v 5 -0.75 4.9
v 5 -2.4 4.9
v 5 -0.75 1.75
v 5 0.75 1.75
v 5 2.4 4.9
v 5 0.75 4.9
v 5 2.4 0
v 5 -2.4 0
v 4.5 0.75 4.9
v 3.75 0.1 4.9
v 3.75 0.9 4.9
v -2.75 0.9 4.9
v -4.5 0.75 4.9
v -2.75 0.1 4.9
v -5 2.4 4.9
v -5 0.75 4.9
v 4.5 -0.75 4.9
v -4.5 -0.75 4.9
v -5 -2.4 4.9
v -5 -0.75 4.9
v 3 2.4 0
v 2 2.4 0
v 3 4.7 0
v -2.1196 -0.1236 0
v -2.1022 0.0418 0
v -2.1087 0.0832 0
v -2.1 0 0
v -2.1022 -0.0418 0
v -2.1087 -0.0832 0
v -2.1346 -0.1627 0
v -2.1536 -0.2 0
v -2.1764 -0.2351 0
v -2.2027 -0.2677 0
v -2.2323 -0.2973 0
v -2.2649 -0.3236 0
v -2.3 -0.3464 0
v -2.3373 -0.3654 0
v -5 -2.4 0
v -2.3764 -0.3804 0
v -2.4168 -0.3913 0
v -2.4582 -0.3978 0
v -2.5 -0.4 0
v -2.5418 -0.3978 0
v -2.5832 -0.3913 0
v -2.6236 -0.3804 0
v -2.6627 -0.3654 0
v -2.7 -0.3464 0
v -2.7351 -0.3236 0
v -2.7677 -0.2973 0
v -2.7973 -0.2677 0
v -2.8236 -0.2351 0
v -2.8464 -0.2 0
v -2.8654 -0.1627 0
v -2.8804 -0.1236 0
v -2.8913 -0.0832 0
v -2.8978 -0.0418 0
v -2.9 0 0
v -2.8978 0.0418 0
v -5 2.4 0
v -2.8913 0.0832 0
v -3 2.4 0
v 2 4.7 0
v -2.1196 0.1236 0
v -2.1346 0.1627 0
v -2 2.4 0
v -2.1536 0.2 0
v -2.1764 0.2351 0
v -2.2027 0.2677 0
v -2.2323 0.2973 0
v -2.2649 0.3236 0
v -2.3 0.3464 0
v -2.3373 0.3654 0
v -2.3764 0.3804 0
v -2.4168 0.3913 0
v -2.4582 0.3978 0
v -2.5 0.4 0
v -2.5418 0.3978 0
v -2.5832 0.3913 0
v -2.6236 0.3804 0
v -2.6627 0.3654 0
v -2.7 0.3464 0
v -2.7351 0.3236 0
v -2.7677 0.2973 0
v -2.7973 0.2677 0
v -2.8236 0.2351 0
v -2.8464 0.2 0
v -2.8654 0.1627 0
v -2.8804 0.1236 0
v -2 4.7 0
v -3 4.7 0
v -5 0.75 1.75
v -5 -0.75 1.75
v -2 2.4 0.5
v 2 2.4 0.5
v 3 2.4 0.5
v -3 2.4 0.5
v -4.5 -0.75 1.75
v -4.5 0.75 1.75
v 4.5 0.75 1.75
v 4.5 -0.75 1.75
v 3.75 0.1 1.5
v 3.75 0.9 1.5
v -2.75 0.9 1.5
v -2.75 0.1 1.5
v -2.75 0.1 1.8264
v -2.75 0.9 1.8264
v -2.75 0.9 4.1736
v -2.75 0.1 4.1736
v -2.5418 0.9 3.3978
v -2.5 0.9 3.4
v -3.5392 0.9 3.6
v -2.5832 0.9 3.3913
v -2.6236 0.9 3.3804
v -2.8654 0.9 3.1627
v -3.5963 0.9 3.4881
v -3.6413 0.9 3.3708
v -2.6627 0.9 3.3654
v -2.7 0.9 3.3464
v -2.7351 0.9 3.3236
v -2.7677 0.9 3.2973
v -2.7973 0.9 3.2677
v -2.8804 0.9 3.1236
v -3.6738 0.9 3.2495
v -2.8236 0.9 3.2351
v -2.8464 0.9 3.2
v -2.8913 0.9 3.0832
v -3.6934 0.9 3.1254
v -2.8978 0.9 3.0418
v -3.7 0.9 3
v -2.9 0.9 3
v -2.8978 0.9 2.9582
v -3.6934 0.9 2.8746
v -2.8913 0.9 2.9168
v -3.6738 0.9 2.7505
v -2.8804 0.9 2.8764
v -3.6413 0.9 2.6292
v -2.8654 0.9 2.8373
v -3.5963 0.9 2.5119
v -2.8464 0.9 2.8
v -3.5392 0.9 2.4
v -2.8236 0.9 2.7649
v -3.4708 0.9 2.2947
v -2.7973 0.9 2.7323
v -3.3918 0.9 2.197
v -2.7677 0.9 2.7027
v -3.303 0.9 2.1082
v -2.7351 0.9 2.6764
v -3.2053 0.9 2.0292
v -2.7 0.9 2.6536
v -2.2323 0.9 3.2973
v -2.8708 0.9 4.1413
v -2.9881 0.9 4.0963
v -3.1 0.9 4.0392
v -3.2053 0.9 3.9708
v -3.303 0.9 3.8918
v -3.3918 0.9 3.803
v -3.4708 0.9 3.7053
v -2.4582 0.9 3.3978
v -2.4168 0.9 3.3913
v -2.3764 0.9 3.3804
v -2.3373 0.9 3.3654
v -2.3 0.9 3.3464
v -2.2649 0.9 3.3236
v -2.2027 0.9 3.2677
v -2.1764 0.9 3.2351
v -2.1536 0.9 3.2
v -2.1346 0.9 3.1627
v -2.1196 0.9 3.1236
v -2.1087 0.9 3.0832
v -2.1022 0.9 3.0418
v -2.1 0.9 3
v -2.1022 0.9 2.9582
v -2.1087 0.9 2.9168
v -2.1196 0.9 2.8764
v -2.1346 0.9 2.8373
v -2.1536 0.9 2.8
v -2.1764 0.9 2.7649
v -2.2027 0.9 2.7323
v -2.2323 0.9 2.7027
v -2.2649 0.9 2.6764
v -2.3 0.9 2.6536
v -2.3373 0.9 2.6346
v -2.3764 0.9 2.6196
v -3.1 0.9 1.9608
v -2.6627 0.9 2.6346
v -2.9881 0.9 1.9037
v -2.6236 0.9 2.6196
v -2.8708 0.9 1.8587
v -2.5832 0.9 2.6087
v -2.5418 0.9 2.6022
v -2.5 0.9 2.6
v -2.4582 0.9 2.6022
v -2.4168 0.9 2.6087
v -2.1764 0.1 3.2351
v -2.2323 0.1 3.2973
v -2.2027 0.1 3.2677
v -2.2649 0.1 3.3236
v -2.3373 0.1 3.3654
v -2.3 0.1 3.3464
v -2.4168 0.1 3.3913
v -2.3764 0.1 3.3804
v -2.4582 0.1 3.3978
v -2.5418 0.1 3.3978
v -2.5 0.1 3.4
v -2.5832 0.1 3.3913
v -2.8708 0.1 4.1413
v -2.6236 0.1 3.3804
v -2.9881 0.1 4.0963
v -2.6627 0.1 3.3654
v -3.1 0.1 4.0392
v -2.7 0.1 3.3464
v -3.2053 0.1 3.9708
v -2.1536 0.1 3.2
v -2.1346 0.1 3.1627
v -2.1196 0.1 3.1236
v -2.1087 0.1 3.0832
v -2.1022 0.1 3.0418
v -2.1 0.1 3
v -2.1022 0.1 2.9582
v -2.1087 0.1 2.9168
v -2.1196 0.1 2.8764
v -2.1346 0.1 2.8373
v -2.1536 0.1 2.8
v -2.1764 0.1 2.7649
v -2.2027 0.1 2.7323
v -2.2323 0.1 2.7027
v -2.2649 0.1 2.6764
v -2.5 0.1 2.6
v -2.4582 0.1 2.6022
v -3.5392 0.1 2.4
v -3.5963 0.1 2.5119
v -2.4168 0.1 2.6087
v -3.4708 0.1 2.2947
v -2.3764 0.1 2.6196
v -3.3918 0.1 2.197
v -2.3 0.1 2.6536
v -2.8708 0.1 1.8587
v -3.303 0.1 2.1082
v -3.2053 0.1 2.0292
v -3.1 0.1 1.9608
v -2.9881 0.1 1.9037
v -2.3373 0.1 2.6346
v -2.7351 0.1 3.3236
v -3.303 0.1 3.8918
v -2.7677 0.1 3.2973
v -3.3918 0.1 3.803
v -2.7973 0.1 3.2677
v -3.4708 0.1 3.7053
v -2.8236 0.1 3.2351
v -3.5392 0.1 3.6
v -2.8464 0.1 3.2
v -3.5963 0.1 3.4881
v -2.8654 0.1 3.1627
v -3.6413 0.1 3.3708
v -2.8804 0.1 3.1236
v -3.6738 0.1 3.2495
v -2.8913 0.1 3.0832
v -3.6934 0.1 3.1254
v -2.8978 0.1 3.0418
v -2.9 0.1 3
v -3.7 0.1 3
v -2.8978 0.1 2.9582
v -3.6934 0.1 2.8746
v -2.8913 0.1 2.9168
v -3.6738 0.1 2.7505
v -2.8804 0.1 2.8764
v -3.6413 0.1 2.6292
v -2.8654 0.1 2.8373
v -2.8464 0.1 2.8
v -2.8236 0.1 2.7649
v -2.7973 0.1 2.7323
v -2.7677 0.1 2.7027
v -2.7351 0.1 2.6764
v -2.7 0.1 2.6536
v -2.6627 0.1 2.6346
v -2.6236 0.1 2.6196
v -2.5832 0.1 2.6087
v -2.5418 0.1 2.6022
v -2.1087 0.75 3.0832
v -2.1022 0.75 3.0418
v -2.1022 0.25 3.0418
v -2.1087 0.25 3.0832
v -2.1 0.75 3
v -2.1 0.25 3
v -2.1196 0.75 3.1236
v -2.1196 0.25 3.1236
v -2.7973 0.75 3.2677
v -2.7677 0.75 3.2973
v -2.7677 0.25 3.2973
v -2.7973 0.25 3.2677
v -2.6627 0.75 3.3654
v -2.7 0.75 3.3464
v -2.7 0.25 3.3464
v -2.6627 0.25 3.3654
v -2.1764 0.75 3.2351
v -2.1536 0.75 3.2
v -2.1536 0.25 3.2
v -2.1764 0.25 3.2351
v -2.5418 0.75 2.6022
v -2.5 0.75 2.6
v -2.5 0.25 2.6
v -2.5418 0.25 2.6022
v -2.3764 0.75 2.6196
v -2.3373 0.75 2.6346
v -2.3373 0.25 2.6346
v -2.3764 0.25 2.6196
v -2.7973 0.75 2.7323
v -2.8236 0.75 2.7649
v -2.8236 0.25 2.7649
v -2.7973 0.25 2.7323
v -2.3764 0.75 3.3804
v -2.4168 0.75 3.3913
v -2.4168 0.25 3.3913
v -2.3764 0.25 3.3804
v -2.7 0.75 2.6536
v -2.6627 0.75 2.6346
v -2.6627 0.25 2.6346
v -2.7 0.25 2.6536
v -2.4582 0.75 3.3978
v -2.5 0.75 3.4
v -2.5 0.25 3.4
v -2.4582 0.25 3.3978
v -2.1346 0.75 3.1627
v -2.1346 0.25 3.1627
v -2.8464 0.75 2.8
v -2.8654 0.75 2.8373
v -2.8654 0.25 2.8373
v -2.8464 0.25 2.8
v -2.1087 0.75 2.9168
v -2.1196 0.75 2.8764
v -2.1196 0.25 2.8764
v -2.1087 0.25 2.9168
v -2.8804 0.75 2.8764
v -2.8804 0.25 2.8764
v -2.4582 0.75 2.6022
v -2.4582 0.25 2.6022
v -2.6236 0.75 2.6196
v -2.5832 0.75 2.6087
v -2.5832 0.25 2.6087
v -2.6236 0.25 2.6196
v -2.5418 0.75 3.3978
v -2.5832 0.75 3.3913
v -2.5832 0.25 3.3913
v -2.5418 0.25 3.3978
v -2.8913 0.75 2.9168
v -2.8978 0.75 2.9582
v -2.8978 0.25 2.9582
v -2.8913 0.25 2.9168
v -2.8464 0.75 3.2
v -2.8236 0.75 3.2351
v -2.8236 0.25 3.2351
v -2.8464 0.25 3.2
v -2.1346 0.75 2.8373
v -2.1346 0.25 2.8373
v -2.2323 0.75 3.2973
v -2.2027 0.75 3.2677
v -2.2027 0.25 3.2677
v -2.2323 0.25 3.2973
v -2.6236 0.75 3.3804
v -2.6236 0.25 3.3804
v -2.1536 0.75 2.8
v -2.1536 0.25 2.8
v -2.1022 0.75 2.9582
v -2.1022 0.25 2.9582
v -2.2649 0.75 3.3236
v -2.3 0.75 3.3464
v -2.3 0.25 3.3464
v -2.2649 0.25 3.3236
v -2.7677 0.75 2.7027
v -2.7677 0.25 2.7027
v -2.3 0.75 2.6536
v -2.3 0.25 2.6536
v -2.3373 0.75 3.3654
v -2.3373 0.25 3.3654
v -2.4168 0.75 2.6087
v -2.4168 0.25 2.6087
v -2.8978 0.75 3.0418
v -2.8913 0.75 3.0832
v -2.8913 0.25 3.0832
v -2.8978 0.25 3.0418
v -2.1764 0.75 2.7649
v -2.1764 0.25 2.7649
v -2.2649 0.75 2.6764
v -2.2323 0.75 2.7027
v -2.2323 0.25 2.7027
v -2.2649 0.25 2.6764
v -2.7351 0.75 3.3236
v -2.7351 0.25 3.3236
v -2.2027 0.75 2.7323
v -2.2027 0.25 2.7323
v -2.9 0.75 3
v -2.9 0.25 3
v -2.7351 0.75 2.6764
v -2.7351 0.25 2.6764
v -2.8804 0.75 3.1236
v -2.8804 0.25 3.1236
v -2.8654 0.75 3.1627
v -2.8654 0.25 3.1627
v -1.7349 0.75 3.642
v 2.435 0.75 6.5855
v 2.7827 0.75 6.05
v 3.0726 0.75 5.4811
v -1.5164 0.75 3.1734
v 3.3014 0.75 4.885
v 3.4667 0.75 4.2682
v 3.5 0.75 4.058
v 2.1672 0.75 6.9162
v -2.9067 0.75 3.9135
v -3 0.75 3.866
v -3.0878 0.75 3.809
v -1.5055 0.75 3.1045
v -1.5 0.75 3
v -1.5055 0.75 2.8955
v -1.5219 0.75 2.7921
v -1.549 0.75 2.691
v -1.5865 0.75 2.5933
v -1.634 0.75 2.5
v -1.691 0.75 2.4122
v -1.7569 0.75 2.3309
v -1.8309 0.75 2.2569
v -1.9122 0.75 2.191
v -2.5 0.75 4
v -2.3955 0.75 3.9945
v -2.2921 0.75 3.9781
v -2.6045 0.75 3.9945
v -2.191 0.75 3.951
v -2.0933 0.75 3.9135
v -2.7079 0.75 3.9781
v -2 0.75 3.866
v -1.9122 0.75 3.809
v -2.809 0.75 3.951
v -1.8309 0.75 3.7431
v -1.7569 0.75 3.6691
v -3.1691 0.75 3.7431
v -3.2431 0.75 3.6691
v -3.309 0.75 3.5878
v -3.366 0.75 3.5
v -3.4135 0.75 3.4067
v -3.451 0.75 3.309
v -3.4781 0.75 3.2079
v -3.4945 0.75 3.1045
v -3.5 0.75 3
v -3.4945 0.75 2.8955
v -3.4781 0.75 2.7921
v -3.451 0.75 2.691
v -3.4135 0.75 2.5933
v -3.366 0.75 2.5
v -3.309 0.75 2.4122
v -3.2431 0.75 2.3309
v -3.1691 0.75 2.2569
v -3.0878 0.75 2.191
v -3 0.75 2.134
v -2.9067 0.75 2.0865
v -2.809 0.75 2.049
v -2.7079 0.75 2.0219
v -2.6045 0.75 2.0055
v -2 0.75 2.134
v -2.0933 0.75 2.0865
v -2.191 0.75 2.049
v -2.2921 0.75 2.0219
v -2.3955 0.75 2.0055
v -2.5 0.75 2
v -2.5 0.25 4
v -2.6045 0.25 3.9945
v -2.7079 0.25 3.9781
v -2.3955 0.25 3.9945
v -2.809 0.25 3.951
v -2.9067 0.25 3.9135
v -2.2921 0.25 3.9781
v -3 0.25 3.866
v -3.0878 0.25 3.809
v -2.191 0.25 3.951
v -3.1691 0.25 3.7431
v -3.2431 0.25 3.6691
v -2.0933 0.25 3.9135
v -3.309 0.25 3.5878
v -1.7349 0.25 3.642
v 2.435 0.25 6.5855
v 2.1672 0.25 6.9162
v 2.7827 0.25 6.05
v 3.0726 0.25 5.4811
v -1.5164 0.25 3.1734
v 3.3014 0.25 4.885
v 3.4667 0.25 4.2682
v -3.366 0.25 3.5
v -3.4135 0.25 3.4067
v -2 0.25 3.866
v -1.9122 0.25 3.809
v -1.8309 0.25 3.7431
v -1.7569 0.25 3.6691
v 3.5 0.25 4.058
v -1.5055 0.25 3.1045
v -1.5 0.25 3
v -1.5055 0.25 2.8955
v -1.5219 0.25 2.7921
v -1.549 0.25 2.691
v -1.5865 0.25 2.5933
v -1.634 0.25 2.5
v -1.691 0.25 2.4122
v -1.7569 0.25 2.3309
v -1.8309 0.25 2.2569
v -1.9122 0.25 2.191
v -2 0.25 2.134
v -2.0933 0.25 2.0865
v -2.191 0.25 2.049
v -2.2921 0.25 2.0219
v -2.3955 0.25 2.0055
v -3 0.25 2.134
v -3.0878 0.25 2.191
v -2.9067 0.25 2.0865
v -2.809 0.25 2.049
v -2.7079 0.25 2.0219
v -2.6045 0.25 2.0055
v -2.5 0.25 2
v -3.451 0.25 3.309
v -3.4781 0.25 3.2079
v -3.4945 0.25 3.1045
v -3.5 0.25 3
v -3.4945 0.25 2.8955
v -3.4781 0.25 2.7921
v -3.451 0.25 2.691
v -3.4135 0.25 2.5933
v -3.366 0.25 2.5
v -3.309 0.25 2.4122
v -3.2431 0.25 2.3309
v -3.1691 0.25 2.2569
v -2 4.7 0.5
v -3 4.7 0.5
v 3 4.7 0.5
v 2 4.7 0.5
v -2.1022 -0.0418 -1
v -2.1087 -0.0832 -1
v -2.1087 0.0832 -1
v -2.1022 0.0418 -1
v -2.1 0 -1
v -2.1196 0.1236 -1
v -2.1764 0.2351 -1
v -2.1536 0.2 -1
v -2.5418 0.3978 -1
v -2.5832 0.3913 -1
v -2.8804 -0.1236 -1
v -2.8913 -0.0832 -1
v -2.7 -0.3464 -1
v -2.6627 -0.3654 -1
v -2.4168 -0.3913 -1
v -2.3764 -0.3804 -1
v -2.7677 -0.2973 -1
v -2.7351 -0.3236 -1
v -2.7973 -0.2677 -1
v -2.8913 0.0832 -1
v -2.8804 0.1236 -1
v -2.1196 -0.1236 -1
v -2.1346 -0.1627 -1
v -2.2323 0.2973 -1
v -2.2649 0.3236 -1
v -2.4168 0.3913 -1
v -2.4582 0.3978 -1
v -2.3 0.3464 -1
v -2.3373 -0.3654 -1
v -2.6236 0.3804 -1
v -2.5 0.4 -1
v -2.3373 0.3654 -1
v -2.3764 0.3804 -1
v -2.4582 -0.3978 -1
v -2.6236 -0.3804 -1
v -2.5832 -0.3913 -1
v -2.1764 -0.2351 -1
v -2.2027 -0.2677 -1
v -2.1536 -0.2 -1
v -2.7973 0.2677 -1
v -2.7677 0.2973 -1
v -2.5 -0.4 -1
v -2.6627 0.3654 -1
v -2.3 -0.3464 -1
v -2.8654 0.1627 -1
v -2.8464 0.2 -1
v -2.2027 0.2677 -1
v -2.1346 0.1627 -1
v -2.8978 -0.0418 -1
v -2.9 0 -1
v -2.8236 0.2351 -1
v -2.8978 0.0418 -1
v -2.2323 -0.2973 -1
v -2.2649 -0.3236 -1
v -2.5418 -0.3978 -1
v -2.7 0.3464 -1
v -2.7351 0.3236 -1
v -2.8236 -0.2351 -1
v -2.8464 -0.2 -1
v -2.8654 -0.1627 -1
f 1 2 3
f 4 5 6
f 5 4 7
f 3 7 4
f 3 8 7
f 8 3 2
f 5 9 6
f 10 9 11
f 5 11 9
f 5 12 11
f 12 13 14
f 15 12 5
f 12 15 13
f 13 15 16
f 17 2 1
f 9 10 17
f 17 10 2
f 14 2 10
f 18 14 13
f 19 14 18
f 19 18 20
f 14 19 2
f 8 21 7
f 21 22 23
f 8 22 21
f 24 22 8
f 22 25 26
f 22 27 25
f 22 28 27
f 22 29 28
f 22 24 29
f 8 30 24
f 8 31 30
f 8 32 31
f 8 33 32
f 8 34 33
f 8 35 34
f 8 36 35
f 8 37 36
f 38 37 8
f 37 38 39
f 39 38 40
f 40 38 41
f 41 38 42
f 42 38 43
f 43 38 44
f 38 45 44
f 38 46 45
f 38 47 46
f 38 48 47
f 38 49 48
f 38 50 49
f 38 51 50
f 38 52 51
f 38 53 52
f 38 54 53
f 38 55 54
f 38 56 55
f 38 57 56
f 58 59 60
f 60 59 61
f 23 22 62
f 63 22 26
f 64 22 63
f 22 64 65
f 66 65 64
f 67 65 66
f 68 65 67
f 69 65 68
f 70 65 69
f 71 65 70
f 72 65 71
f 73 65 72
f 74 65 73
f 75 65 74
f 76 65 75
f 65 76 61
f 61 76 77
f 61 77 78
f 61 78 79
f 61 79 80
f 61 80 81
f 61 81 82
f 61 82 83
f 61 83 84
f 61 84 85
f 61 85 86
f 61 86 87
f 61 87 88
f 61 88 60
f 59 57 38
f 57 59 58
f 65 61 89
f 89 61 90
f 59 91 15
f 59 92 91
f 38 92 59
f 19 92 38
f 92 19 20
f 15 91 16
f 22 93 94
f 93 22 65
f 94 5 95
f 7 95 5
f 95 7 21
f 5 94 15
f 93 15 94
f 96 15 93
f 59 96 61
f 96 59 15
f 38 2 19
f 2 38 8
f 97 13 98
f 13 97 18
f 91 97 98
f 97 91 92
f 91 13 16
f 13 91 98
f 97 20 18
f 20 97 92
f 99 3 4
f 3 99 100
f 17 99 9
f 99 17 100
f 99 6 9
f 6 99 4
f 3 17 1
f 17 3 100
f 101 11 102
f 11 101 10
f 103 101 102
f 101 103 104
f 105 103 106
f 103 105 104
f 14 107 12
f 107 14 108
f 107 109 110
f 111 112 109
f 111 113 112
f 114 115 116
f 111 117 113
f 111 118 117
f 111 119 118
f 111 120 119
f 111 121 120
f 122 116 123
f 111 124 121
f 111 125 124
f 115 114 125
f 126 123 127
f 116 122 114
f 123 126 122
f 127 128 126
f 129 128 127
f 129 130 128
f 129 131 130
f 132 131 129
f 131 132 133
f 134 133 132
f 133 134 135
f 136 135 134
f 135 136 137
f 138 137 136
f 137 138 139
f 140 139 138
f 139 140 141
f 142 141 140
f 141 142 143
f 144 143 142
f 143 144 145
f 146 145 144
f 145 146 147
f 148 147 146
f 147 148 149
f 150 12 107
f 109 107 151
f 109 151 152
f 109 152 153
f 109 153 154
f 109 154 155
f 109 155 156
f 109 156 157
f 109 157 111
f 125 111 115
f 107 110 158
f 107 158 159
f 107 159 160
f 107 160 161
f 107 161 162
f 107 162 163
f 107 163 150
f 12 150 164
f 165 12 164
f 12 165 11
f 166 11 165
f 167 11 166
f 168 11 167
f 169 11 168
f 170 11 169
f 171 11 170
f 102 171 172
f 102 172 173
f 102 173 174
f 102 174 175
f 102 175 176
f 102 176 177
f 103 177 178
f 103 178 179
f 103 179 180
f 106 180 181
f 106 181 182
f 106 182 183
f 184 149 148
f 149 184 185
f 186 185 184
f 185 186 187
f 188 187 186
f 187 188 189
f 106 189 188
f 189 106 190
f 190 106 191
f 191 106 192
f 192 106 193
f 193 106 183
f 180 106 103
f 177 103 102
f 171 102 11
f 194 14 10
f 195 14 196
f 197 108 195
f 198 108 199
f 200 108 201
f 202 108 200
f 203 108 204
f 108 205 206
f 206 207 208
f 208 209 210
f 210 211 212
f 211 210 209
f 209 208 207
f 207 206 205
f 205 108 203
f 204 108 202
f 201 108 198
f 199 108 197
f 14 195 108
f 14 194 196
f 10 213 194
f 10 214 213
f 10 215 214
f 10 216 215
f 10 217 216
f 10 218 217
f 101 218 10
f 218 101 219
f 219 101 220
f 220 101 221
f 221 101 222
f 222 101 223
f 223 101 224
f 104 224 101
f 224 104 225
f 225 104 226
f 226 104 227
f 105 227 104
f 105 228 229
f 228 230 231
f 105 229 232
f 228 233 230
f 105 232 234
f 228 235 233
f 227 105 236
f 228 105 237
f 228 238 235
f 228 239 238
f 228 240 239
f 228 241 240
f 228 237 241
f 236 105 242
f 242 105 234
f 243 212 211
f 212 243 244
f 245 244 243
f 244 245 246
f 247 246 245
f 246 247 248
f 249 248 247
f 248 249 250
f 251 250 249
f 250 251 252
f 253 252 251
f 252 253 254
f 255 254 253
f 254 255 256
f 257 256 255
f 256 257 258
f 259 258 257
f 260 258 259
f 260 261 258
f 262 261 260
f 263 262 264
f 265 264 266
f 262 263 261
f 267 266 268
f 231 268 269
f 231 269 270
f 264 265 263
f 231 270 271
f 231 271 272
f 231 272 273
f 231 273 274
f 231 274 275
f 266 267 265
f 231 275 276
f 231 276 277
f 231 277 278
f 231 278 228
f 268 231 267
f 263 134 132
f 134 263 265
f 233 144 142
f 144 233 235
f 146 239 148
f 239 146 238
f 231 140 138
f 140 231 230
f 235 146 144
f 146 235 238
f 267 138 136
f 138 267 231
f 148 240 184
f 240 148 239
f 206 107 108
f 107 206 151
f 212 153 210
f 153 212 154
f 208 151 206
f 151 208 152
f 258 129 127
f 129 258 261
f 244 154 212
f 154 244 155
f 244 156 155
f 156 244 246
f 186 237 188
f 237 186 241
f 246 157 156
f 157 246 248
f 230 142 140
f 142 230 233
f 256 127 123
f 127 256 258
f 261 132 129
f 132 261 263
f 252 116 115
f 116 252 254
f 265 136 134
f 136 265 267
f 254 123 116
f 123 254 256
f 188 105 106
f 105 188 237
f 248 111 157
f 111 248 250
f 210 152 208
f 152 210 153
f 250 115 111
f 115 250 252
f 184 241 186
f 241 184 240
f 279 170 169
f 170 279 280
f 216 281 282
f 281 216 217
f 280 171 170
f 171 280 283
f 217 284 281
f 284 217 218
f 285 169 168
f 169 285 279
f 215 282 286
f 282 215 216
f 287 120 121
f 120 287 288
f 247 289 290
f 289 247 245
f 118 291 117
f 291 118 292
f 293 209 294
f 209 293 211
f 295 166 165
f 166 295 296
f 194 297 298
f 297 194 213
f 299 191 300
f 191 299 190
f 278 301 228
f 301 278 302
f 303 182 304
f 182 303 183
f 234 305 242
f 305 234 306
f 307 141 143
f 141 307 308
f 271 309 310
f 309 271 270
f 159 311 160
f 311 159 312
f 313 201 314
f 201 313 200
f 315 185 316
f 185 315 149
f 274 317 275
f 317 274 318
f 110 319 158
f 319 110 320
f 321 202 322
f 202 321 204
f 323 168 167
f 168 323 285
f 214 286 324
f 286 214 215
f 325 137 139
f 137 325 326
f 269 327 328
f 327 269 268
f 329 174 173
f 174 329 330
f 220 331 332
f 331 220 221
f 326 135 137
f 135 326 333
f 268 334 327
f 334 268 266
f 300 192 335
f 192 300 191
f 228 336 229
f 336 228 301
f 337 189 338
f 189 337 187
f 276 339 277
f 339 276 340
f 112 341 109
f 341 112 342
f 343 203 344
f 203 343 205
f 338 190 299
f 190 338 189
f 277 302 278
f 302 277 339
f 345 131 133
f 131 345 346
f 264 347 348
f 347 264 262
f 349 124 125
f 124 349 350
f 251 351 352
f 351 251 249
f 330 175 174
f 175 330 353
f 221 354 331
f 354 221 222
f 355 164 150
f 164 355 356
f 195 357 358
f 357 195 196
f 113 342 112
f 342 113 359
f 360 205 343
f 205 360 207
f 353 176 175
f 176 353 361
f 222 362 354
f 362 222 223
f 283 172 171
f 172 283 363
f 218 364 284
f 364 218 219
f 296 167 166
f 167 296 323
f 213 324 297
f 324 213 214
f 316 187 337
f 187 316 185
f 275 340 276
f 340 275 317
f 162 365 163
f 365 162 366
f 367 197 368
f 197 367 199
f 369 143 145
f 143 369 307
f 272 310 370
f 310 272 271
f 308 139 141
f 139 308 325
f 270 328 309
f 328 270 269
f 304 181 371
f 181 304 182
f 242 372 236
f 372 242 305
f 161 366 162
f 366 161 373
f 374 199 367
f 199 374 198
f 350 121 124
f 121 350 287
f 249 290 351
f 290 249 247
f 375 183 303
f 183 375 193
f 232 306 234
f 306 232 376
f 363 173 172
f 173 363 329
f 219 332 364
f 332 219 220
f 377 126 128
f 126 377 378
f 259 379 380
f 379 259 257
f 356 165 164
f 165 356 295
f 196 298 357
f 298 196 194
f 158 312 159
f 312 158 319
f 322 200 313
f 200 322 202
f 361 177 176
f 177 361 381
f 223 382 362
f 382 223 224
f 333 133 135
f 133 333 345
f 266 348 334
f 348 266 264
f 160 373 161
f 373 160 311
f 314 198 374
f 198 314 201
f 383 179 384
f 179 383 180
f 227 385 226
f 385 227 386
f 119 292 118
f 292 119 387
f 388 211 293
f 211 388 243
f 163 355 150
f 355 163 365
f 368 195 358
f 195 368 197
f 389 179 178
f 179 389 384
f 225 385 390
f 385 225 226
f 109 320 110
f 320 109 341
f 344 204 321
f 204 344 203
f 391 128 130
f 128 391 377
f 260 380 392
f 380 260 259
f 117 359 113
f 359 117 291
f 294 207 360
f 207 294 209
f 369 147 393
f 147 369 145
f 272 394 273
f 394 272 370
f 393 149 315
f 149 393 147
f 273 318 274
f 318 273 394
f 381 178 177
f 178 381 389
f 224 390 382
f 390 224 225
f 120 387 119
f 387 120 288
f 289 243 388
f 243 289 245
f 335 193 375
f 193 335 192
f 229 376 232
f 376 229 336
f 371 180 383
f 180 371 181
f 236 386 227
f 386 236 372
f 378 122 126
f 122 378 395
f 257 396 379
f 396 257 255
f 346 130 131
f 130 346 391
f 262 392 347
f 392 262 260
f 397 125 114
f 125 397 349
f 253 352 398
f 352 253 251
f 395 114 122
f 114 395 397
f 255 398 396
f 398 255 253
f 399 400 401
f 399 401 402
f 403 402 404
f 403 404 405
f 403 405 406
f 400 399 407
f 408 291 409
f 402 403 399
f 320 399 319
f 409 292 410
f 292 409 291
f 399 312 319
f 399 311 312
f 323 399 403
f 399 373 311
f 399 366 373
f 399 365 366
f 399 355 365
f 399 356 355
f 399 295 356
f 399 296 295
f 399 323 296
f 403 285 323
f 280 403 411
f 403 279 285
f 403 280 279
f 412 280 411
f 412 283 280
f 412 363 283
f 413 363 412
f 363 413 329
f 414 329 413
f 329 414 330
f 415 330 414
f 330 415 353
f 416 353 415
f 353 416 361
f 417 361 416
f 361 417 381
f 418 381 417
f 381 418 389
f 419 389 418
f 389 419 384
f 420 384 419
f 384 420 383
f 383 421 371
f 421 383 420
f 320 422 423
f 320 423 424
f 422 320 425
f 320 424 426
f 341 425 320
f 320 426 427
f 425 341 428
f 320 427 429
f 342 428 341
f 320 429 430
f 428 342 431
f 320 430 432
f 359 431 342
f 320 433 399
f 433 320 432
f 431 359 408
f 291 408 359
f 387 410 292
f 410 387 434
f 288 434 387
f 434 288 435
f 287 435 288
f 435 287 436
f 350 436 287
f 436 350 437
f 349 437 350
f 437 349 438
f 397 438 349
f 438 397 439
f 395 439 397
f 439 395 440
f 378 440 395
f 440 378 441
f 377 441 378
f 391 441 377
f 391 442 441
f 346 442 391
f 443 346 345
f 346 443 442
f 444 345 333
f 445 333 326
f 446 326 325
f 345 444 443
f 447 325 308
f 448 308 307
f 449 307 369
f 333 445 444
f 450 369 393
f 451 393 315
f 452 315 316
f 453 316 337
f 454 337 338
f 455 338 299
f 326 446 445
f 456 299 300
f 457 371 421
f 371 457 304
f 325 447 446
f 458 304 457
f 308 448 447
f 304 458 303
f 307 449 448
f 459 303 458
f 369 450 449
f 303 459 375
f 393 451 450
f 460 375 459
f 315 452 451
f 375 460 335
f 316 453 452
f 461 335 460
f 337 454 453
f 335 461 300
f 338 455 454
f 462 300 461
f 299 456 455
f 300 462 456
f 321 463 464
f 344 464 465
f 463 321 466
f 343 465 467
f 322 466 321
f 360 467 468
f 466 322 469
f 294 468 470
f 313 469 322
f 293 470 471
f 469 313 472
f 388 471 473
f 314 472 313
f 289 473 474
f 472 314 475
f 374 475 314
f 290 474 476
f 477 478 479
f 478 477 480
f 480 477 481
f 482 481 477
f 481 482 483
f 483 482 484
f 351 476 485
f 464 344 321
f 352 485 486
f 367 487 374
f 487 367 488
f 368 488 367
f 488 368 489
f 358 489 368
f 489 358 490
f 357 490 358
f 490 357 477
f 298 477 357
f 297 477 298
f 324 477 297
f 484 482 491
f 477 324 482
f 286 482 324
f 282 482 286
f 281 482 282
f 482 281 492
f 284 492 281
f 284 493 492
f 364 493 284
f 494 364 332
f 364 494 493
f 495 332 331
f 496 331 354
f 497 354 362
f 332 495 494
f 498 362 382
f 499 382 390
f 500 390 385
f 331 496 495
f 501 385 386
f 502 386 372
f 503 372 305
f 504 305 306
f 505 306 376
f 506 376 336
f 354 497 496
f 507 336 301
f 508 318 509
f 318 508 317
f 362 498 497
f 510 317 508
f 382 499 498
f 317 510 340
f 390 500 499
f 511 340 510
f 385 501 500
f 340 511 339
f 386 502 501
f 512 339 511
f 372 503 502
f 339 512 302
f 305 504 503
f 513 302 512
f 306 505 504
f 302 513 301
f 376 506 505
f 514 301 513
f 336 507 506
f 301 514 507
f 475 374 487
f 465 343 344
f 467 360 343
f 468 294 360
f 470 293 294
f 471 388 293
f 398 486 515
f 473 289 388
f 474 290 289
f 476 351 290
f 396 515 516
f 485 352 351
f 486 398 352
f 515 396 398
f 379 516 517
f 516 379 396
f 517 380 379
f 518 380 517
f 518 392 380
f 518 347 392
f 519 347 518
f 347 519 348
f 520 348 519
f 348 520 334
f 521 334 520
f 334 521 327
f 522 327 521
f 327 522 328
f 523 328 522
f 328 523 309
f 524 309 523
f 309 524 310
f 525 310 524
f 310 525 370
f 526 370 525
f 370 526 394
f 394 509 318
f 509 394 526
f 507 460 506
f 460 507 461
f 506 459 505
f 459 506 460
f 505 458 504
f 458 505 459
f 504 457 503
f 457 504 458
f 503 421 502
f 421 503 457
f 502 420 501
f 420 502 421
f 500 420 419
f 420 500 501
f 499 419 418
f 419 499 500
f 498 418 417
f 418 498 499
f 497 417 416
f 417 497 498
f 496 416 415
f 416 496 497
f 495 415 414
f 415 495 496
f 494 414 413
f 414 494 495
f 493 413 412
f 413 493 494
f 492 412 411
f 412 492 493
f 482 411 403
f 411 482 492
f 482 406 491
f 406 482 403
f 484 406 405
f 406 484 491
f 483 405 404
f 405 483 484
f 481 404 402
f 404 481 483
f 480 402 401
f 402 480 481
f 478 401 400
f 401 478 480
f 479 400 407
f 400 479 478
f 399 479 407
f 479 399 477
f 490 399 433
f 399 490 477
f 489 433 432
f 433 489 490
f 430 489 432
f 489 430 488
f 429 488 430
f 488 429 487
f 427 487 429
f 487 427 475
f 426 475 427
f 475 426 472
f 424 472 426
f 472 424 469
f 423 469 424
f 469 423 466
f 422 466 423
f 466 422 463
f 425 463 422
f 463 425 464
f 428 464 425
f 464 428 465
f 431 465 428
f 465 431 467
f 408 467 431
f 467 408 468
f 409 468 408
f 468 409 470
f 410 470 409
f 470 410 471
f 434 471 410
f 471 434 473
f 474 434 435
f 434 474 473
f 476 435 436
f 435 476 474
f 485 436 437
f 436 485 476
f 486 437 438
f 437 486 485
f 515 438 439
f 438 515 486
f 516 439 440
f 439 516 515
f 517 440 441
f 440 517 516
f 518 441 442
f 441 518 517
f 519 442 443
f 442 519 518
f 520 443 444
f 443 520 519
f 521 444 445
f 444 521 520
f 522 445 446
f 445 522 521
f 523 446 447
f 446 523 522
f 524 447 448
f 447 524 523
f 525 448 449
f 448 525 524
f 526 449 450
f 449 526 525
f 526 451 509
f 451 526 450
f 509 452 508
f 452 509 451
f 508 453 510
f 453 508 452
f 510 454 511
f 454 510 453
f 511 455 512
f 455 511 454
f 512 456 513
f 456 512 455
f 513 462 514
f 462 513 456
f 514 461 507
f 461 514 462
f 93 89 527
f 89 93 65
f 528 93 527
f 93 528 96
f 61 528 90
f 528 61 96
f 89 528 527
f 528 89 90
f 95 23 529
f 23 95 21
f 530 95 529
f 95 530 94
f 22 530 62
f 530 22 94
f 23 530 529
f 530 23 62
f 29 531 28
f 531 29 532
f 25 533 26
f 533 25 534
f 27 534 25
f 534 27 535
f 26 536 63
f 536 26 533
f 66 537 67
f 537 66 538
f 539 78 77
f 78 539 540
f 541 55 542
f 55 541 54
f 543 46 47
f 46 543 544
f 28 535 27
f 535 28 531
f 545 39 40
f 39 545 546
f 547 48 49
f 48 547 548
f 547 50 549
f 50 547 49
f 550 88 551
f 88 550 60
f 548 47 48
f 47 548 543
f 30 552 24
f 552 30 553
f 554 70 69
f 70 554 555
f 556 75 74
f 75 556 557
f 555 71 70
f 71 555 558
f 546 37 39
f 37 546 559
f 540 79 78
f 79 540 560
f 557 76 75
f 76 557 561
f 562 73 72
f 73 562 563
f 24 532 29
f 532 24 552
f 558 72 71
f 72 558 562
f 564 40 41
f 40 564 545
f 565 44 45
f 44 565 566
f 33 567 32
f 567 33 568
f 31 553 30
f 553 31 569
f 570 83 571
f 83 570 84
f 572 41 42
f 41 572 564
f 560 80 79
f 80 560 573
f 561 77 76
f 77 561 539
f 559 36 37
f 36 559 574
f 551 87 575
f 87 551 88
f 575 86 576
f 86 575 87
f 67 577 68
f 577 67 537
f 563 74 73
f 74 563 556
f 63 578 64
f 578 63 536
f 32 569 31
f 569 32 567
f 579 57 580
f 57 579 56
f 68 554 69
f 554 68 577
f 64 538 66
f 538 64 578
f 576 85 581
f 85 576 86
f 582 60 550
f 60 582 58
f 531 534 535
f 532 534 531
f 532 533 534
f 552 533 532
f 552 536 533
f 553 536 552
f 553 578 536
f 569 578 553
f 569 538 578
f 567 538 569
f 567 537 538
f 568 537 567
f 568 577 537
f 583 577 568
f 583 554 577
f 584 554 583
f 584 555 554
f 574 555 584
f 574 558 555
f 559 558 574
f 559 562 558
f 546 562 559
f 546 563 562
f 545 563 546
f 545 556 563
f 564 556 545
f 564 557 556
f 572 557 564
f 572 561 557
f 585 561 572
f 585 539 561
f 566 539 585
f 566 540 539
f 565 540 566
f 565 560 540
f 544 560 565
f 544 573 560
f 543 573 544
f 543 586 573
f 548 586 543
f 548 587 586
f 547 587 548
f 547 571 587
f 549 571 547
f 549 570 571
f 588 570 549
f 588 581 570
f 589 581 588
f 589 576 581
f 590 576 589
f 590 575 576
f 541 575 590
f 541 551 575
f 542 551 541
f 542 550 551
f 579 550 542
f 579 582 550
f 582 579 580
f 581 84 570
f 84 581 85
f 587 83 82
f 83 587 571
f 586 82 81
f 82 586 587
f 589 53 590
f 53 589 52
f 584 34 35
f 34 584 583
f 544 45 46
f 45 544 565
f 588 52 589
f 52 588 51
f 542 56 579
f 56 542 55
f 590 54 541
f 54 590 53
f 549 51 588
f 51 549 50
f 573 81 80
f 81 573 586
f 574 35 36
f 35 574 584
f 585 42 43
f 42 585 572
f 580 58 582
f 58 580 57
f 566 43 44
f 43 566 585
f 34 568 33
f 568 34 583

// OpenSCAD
// SMD Slide Switch (2-Pin Variant, Extended Position)
// Origin [0,0,0] is located at the center of the bottom face of the main body.

$fn = 60;

section = false;

module smd_slide_switch_2pin() {
    body();
    lever();
    terminals();
    alignment_pins();
}

module body() {
    // Main plastic housing
    color([0.15, 0.15, 0.15]) // Black/Dark Gray
    difference() {
	    // Centered in X and Y, sitting on Z=0
	    translate([0, 0, 2.45])
		cube([10, 4.8, 4.9], center=true);


        // clip
        translate([-5, 0, 3.5]) cube([1, 1.5, 3.5], center=true);
        translate([ 5, 0, 3.5]) cube([1, 1.5, 3.5], center=true);

        // Top lever operating slot (6.5mm long, centered above)
        translate([0.5, 0.5, 3.5]) cube([6.5, 0.8, 4.0], center=true);
        translate([-2.5,0.9,3]) rotate([90,0,0]) cylinder(h=0.8, r=1.2);
        // Pivot pin visualization hole on the side
        translate([-2.5, 0, 3.0]) rotate([90, 0, 0]) cylinder(h=10, r=0.4, center=true);
    }
}

module lever() {
    // Lever modeled as an arc centered at the pivot point
    // Pivot origin: X = -2.5, Z = 3.0
    // The tip reaches exactly X = 2.1, Z = 7.0 (relative to absolute origin)
    
    pivot_x = -2.5;
    pivot_z = 3.0;
    
    // Calculate radius to reach the [2.1, 7.0] tip
    // dx = 2.1 - (-2.5) = 4.6
    // dz = 7.0 - 3.0 = 4.0
    // r_outer = sqrt(4.6^2 + 4.0^2) ≈ 6.1
    r_outer = 6.1;
    
    color([0.95, 0.95, 0.95]) // White plastic
    translate([pivot_x, 0.5, pivot_z])
    rotate([90, 0, 0])
    linear_extrude(height = 0.5, center = true) {
        union(){
			difference(){			 
				circle(r=1);
				circle(r=0.4);
			}
			intersection() {
				circle(r = r_outer);
				// Bounding wedge to form the arc sweep
				// Starts at ~41 degrees (to hit the tip coordinate) and sweeps backwards
				polygon([
					[0, 0],
					[10 * sin(50), 10 * cos(50)],
					[10 * sin(80), 10 * cos(80)]
				]);
			}
		}
    }
	color([0.75, 0.75, 0.8]) translate([pivot_x, 0, pivot_z]) rotate([90,0,0]) cylinder(h=4.8, r=0.4, center=true);
}

module terminals() {
    // 2 SMD Gull-Wing Pins on the front side
    // Pitch is 5.0mm (Centered at X = -2.5 and X = 2.5)
    pin(-2.5);
    pin(2.5);
}

module pin(x_pos) {
    // Front face of the body is at Y = 2.4
    y_face = 2.4; 
    
  color([0.75, 0.75, 0.8]) // Silver metal finish
  translate([x_pos - 0.5, y_face, 0])
  cube([1.0, 2.3, 0.5]);
}

module alignment_pins() {
    // Plastic alignment pins on the bottom, 1mm deep
    // Located at the same X positions as the electrical pins
    color([0.15, 0.15, 0.15]) {
        translate([-2.5, 0, -1.0]) cylinder(h=1.0, r=0.4);
    }
}

// Render the switch
if(section){
 intersection(){
  translate([-12.5,0,0]) cube(20, center=true);
  smd_slide_switch_2pin();
  }
}
else{
	smd_slide_switch_2pin();
}
